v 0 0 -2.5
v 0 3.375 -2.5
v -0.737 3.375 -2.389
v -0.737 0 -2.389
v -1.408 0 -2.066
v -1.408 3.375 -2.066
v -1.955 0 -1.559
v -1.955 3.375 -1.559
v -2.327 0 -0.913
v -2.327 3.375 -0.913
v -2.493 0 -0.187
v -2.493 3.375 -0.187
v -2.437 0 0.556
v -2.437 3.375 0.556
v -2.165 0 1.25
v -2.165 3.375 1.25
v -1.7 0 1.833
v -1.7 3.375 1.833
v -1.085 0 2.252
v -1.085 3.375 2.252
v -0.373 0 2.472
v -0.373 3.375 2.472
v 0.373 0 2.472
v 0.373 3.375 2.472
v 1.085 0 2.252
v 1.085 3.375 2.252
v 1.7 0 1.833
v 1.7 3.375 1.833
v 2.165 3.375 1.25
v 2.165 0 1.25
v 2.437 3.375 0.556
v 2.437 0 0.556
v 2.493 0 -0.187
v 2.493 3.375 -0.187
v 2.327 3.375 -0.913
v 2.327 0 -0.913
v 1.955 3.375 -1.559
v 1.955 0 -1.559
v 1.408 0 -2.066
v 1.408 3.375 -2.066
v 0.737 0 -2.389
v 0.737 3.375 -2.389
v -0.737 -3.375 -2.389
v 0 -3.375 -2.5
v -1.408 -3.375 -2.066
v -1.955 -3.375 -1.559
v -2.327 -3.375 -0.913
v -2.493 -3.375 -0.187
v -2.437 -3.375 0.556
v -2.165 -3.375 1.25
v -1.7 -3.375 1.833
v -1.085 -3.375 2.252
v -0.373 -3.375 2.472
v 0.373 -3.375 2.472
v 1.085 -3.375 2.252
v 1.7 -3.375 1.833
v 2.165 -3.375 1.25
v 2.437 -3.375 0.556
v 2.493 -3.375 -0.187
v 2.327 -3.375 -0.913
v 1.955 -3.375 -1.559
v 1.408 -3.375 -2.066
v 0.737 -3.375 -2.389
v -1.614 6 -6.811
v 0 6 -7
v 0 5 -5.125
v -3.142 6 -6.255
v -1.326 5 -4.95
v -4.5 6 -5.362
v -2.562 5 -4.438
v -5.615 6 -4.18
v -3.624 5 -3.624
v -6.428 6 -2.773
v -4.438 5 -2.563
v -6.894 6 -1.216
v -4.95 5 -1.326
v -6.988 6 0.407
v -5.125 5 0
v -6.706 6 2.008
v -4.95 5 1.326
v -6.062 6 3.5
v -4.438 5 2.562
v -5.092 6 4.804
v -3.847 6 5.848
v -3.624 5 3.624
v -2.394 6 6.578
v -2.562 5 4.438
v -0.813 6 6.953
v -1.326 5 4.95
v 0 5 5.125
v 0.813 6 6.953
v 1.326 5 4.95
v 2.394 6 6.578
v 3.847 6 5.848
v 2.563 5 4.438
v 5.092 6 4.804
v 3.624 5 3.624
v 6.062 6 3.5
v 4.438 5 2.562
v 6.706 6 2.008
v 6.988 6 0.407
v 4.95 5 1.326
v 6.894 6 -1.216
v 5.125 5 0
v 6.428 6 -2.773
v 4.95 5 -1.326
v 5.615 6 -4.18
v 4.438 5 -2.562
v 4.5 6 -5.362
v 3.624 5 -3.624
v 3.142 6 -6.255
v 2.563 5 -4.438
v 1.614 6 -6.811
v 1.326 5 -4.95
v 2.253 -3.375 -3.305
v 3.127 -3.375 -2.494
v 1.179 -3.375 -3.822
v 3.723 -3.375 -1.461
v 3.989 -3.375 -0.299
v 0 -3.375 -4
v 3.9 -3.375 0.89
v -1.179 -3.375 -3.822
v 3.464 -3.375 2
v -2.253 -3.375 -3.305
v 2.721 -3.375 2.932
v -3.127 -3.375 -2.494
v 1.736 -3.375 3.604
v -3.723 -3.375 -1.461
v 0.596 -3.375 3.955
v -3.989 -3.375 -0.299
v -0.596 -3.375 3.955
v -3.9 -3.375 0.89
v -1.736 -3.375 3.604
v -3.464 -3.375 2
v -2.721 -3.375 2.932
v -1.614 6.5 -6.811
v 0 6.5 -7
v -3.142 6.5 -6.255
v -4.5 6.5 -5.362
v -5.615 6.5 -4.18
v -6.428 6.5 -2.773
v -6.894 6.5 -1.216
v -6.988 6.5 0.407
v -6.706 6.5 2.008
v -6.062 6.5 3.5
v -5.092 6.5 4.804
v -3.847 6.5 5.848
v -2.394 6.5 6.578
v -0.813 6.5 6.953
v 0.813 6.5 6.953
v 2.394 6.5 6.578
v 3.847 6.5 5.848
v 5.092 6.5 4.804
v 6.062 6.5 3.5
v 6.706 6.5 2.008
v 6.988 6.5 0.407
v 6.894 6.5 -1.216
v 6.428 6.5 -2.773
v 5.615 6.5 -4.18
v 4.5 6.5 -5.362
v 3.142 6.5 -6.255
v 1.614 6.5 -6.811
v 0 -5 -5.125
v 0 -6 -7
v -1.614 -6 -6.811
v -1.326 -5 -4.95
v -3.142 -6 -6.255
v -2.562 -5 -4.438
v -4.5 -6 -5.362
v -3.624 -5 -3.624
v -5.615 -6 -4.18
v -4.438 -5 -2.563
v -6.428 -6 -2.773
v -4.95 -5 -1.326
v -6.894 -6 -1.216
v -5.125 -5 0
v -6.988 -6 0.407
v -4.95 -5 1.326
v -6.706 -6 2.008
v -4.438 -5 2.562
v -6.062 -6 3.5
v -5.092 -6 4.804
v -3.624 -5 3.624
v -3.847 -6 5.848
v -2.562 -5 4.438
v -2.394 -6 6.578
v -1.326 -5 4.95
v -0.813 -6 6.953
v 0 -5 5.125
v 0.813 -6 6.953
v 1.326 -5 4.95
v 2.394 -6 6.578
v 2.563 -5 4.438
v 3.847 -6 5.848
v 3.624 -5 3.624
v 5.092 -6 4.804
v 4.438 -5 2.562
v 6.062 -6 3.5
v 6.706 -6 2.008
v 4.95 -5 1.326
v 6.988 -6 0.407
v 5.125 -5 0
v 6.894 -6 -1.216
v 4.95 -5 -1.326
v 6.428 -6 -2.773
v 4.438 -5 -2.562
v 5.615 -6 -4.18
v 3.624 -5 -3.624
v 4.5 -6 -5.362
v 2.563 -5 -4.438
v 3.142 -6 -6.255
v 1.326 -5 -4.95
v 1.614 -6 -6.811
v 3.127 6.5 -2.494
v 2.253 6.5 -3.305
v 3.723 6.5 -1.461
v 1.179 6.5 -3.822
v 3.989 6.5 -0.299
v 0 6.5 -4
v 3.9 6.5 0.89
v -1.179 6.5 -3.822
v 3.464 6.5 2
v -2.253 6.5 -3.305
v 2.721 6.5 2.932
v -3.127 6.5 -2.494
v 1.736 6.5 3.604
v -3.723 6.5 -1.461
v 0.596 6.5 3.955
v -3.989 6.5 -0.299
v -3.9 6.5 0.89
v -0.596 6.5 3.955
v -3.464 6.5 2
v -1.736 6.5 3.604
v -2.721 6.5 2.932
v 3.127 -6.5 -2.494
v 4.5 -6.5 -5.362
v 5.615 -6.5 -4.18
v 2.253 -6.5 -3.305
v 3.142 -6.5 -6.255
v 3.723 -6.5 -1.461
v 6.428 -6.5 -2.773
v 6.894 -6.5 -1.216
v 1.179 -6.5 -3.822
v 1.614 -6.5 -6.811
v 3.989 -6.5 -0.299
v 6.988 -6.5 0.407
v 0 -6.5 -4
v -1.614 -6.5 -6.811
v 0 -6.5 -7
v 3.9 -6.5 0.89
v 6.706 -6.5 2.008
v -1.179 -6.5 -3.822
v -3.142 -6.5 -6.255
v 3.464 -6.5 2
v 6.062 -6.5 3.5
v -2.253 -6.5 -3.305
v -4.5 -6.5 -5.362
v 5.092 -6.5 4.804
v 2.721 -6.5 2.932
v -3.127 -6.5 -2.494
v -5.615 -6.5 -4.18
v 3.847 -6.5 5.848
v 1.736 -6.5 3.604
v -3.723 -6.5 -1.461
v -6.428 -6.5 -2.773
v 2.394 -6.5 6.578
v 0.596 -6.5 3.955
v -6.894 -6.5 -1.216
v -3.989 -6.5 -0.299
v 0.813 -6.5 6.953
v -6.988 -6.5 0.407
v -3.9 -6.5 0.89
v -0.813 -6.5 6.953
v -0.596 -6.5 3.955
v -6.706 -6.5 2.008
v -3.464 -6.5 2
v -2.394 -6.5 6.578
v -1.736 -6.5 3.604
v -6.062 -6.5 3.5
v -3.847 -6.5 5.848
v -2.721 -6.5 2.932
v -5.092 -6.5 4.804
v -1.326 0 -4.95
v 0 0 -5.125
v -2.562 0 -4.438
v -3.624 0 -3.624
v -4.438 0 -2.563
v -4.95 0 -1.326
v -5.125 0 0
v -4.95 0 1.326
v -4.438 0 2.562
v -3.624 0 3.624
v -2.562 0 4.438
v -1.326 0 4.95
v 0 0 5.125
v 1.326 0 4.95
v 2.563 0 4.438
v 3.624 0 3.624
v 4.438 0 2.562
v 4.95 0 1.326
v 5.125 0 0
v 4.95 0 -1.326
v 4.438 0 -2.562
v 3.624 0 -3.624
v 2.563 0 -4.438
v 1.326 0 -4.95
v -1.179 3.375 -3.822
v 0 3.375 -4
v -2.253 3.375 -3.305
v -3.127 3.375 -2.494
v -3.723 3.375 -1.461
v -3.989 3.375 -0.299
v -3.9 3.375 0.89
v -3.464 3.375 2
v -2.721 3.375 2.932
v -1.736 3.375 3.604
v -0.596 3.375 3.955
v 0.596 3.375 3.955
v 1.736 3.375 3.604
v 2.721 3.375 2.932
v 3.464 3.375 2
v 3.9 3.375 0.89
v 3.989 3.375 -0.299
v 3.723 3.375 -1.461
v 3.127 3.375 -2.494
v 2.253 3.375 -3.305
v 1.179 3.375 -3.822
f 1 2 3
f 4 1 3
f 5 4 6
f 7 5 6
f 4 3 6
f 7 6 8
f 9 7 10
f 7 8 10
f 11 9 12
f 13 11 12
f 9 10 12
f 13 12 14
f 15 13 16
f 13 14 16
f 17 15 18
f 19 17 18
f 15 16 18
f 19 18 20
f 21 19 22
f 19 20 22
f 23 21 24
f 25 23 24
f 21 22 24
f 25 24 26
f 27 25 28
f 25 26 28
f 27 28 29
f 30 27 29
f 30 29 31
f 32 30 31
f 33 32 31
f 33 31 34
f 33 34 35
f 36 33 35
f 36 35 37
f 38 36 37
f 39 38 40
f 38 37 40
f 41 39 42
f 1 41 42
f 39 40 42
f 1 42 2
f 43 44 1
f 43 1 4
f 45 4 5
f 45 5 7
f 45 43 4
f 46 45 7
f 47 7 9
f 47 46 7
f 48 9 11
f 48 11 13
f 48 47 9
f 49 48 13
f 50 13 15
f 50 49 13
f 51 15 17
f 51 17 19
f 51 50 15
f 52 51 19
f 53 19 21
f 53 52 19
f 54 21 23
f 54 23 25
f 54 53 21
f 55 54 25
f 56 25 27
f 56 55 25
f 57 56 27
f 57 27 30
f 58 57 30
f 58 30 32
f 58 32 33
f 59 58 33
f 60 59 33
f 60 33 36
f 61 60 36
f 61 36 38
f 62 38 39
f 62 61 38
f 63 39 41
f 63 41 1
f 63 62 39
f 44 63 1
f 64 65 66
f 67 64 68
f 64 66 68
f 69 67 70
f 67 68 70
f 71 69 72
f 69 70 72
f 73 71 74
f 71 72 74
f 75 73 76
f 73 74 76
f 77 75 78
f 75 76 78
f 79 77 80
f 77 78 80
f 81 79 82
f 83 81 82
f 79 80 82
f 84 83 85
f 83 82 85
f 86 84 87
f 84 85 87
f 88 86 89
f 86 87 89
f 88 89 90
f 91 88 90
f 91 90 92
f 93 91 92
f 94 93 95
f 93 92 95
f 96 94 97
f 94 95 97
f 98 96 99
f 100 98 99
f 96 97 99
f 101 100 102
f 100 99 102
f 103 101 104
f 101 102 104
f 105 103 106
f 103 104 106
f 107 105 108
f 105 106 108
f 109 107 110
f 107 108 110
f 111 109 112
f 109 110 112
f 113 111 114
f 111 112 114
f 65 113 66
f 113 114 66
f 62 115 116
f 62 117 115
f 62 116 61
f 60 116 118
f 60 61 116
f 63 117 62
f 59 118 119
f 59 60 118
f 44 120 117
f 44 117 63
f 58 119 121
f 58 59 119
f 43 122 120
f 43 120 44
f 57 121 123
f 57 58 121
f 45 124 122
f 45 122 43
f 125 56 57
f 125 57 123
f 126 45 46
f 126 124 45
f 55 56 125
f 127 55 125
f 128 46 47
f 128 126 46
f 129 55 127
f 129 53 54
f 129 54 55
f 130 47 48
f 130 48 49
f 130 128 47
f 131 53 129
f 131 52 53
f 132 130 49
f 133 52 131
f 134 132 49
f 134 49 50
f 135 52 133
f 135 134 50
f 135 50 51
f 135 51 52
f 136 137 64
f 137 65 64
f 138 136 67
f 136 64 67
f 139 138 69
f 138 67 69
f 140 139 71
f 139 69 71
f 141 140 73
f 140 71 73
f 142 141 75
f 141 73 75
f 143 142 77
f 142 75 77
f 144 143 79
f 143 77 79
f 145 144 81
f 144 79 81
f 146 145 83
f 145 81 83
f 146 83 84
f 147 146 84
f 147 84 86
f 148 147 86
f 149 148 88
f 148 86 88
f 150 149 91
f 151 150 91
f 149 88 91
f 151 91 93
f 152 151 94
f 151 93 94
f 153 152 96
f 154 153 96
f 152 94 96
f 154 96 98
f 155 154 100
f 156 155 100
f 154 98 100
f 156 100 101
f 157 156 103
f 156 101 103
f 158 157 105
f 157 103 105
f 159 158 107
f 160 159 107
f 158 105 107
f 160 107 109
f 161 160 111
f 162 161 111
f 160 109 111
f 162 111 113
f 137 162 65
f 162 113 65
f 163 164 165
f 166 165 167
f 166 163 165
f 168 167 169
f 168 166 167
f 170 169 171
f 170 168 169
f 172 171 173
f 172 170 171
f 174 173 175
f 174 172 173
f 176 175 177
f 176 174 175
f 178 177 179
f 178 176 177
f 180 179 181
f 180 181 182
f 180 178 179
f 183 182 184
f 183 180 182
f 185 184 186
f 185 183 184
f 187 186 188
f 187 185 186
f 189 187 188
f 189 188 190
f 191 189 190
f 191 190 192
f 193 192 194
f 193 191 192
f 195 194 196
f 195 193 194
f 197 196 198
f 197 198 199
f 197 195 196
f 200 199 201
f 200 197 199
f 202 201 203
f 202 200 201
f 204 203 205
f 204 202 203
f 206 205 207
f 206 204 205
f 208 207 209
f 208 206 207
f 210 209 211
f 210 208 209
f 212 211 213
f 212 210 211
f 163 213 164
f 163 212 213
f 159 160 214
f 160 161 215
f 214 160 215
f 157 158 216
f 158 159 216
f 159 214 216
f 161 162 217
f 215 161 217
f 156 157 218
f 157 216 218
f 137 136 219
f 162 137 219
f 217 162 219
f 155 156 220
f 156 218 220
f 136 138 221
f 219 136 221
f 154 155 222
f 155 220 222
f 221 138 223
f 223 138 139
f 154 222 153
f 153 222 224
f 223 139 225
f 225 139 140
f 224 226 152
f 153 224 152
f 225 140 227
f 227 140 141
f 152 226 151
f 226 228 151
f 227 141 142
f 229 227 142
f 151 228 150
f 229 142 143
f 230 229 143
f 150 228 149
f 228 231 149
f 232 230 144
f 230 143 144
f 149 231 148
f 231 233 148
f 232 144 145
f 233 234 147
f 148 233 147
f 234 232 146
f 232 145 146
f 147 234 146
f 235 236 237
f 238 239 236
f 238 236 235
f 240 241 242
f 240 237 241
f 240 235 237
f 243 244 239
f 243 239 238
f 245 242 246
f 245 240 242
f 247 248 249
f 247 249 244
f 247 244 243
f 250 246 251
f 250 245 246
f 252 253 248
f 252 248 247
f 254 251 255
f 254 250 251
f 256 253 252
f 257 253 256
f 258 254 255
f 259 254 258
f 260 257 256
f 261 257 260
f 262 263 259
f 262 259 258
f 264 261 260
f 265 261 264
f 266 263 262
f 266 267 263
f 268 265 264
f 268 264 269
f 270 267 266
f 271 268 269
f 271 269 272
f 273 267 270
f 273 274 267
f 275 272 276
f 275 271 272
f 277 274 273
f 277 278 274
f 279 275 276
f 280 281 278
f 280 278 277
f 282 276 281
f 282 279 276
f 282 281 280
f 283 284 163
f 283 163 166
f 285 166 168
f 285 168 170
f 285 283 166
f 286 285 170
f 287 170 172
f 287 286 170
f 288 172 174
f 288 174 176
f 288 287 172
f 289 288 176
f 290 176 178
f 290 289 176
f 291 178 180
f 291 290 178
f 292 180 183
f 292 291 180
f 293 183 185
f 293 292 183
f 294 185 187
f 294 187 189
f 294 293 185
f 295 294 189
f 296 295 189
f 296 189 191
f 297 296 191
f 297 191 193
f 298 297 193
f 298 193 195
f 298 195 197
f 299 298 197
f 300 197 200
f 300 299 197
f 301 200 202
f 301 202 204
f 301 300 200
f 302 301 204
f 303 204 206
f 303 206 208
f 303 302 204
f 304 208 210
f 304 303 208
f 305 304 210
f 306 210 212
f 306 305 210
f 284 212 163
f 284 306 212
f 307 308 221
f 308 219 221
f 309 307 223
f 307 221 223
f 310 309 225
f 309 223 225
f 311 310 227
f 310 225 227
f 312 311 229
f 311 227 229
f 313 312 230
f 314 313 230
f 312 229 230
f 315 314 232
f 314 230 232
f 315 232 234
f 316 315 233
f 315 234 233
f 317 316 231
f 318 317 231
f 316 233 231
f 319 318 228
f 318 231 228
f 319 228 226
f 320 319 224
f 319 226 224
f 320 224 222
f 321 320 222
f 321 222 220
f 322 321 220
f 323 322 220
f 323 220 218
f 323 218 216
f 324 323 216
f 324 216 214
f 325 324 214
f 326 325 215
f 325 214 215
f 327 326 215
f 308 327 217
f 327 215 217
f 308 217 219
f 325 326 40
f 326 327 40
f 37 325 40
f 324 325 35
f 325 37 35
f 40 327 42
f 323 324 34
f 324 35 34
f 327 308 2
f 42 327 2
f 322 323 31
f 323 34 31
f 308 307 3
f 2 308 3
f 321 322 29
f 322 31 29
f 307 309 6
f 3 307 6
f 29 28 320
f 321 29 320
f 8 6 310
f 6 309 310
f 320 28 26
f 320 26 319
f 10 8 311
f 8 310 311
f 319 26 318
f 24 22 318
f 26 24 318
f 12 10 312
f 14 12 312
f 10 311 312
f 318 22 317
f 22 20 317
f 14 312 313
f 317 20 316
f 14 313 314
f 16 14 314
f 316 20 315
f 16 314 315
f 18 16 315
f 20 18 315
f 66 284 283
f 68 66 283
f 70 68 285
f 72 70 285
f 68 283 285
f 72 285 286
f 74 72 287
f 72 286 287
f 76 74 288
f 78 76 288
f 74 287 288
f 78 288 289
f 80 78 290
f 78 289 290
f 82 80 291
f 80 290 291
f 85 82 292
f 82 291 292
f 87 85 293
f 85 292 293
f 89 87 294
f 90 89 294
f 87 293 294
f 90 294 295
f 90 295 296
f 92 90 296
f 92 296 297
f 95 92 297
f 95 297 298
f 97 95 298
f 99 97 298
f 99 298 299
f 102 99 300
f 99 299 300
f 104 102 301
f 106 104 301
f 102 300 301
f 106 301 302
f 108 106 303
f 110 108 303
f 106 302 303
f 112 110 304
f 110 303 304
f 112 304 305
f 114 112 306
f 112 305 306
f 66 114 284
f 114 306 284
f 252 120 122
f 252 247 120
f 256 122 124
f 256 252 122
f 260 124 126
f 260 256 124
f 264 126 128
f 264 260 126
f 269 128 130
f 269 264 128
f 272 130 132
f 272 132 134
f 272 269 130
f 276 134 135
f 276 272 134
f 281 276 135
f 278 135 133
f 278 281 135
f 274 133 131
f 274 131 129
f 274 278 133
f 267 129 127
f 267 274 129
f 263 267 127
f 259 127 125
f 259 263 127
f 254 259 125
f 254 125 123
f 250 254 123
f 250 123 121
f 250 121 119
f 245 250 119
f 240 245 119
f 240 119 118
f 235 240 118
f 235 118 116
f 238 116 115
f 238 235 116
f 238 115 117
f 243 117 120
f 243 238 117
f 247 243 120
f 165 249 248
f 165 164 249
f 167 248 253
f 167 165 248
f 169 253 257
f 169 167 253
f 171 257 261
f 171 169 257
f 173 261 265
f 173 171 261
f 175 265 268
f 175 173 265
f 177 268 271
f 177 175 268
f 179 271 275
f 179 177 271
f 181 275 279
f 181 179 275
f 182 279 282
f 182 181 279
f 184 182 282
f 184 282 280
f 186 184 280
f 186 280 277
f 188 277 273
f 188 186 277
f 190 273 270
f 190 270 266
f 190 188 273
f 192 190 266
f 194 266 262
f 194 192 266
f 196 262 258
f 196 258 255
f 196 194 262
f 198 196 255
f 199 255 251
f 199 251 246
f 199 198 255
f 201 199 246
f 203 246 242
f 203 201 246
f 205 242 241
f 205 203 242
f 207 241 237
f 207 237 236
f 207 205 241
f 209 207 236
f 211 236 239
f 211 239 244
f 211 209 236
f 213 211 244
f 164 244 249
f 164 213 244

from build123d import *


with BuildPart() as part:
    # Sketch2 → Revolve1 (revolve)
    with BuildSketch(Plane(origin=(0, 0, 0), x_dir=(0, 0, -1), z_dir=(1, 0, 0))):
        Polygon((2.5, 0), (2.5, 3.375), (4, 3.375), (4, 6.5), (7, 6.5), (7, 6), (5.125, 5), (5.125, 0), align=None)
    revolve1 = revolve(axis=Axis((0, 0, 0), (0, 1, 0)))

    # Mirror1: Revolve1 across plane
    add(revolve1.mirror(Plane.ZX))


solid = part.part
